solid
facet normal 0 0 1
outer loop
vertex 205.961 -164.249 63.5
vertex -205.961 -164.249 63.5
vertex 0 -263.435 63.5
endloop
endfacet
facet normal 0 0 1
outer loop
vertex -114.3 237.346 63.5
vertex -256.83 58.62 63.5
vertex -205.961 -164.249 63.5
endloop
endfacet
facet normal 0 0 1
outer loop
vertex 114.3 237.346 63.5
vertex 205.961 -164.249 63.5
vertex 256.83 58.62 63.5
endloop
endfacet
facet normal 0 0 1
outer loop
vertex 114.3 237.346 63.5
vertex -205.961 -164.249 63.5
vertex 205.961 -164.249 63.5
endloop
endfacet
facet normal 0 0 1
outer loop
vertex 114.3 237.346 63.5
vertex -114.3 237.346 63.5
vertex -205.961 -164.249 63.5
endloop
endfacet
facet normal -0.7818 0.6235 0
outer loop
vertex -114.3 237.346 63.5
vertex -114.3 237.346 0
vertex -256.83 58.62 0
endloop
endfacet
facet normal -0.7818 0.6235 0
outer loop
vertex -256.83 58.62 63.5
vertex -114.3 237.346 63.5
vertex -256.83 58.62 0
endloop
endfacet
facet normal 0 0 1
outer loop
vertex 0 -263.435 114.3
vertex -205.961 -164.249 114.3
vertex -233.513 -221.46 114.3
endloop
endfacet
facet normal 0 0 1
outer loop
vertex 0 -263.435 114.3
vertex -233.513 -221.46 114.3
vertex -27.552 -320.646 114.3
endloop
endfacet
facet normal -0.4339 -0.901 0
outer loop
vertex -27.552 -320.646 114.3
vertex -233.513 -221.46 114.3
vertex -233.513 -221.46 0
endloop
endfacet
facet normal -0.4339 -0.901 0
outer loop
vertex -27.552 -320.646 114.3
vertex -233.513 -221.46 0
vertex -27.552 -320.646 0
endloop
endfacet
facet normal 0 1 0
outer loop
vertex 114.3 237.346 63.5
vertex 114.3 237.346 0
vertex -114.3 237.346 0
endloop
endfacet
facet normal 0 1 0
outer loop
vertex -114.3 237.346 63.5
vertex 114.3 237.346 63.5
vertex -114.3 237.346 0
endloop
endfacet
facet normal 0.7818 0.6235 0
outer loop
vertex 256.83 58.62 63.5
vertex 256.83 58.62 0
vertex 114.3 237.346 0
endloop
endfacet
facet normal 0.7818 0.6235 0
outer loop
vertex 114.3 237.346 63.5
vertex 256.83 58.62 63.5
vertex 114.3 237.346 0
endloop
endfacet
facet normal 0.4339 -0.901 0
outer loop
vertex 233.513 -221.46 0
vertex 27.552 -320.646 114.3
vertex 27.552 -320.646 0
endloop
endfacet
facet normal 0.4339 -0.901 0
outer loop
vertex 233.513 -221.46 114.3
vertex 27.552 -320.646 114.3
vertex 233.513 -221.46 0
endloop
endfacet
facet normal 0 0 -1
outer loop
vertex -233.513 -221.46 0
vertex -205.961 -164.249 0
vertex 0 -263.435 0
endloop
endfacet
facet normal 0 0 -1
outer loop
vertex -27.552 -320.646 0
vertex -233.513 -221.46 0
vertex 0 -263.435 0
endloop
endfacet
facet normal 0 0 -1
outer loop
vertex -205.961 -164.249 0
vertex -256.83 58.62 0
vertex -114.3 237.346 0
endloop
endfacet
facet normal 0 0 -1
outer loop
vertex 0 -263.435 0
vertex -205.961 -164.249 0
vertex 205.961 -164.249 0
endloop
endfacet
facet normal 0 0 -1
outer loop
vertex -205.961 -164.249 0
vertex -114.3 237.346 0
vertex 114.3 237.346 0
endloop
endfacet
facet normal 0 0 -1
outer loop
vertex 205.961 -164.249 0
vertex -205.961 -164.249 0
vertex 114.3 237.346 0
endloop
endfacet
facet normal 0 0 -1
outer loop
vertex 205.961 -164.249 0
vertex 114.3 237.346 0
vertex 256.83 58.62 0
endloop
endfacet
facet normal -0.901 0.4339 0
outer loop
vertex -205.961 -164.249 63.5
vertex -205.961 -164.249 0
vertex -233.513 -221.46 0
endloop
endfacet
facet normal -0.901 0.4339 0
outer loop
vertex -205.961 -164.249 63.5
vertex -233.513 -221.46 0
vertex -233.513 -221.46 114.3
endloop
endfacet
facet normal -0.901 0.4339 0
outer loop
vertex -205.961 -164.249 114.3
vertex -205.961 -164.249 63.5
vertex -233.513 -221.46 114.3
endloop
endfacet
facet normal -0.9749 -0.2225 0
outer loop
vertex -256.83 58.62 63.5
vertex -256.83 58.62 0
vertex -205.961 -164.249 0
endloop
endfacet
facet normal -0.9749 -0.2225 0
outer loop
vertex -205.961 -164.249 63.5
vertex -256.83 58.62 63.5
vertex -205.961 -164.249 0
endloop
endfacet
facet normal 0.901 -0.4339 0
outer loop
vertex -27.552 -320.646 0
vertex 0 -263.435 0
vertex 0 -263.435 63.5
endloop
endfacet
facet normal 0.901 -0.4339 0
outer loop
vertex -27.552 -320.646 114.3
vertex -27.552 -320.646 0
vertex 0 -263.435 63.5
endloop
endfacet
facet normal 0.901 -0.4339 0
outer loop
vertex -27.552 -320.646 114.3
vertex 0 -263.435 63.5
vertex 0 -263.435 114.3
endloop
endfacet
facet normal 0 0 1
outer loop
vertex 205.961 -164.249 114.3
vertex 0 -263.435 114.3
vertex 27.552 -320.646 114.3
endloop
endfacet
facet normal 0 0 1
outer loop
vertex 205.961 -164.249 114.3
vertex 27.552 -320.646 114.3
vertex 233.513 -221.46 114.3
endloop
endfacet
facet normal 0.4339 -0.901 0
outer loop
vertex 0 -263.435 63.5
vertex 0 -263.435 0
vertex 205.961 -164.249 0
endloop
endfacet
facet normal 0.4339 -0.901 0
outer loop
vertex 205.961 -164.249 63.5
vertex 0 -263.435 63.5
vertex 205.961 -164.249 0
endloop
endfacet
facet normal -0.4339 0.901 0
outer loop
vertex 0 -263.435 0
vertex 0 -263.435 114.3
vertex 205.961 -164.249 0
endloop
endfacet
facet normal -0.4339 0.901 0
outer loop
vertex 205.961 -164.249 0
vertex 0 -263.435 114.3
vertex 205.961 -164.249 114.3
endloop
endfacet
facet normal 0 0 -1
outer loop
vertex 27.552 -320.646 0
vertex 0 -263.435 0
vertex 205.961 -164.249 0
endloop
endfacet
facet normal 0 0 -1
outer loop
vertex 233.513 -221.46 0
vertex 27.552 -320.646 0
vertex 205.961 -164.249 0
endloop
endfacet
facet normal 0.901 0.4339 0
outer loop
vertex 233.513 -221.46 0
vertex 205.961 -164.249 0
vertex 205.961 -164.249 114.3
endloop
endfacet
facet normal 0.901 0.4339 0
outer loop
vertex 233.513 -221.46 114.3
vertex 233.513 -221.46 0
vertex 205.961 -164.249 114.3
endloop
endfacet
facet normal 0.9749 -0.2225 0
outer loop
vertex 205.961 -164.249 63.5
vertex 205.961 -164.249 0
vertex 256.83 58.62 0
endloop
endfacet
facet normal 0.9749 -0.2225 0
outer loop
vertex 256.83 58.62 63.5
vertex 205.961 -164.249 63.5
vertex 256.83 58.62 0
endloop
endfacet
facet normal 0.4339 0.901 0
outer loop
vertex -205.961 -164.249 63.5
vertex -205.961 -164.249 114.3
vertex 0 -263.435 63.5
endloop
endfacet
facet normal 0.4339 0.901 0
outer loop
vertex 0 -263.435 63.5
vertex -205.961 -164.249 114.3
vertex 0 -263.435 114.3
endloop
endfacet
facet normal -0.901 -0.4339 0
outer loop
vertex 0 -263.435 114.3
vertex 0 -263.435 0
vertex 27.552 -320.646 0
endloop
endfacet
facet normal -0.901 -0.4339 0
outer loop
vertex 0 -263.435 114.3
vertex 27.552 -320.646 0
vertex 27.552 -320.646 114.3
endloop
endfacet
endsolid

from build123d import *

# Parameters (mm, degrees)
F1_DEPTH = 63.5
F2_W     = 228.6
F2_H     = 114.3
F3_DEPTH = 63.5
F4_W     = 228.6
F4_H     = 114.3
F5_DEPTH = 63.5


with BuildPart() as f1:
    # F0 (on Top) → F1 (new body)
    with BuildSketch(Plane.XY):
        Polygon((114.3, 237.3463956282), (-114.3, 237.3463956282), (-256.8297687049, 58.619718736), (-205.9614832025, -164.2488019887), (0, -263.434624751), (205.9614832025, -164.2488019887), (256.8297687049, 58.619718736), align=None)
    extrude(amount=F1_DEPTH)

    # F2 (on face) → F3 (join)
    with BuildSketch(Plane(origin=(-102.9807416012, -213.8417133699, 0), x_dir=(0.9009688679, -0.4338837391, 0), z_dir=(-0.4338837391, -0.9009688679, 0))):
        with Locations((0, 57.15)):
            Rectangle(F2_W, F2_H)
    extrude(amount=F3_DEPTH)


with BuildPart() as f5:
    # F4 (on face) → F5 (new body)
    with BuildSketch(Plane(origin=(102.9807416012, -213.8417133699, 0), x_dir=(0.9009688679, 0.4338837391, 0), z_dir=(0.4338837391, -0.9009688679, 0))):
        with Locations((0, 57.15)):
            Rectangle(F4_W, F4_H)
    extrude(amount=F5_DEPTH)


solid = Compound([f1.part, f5.part])
